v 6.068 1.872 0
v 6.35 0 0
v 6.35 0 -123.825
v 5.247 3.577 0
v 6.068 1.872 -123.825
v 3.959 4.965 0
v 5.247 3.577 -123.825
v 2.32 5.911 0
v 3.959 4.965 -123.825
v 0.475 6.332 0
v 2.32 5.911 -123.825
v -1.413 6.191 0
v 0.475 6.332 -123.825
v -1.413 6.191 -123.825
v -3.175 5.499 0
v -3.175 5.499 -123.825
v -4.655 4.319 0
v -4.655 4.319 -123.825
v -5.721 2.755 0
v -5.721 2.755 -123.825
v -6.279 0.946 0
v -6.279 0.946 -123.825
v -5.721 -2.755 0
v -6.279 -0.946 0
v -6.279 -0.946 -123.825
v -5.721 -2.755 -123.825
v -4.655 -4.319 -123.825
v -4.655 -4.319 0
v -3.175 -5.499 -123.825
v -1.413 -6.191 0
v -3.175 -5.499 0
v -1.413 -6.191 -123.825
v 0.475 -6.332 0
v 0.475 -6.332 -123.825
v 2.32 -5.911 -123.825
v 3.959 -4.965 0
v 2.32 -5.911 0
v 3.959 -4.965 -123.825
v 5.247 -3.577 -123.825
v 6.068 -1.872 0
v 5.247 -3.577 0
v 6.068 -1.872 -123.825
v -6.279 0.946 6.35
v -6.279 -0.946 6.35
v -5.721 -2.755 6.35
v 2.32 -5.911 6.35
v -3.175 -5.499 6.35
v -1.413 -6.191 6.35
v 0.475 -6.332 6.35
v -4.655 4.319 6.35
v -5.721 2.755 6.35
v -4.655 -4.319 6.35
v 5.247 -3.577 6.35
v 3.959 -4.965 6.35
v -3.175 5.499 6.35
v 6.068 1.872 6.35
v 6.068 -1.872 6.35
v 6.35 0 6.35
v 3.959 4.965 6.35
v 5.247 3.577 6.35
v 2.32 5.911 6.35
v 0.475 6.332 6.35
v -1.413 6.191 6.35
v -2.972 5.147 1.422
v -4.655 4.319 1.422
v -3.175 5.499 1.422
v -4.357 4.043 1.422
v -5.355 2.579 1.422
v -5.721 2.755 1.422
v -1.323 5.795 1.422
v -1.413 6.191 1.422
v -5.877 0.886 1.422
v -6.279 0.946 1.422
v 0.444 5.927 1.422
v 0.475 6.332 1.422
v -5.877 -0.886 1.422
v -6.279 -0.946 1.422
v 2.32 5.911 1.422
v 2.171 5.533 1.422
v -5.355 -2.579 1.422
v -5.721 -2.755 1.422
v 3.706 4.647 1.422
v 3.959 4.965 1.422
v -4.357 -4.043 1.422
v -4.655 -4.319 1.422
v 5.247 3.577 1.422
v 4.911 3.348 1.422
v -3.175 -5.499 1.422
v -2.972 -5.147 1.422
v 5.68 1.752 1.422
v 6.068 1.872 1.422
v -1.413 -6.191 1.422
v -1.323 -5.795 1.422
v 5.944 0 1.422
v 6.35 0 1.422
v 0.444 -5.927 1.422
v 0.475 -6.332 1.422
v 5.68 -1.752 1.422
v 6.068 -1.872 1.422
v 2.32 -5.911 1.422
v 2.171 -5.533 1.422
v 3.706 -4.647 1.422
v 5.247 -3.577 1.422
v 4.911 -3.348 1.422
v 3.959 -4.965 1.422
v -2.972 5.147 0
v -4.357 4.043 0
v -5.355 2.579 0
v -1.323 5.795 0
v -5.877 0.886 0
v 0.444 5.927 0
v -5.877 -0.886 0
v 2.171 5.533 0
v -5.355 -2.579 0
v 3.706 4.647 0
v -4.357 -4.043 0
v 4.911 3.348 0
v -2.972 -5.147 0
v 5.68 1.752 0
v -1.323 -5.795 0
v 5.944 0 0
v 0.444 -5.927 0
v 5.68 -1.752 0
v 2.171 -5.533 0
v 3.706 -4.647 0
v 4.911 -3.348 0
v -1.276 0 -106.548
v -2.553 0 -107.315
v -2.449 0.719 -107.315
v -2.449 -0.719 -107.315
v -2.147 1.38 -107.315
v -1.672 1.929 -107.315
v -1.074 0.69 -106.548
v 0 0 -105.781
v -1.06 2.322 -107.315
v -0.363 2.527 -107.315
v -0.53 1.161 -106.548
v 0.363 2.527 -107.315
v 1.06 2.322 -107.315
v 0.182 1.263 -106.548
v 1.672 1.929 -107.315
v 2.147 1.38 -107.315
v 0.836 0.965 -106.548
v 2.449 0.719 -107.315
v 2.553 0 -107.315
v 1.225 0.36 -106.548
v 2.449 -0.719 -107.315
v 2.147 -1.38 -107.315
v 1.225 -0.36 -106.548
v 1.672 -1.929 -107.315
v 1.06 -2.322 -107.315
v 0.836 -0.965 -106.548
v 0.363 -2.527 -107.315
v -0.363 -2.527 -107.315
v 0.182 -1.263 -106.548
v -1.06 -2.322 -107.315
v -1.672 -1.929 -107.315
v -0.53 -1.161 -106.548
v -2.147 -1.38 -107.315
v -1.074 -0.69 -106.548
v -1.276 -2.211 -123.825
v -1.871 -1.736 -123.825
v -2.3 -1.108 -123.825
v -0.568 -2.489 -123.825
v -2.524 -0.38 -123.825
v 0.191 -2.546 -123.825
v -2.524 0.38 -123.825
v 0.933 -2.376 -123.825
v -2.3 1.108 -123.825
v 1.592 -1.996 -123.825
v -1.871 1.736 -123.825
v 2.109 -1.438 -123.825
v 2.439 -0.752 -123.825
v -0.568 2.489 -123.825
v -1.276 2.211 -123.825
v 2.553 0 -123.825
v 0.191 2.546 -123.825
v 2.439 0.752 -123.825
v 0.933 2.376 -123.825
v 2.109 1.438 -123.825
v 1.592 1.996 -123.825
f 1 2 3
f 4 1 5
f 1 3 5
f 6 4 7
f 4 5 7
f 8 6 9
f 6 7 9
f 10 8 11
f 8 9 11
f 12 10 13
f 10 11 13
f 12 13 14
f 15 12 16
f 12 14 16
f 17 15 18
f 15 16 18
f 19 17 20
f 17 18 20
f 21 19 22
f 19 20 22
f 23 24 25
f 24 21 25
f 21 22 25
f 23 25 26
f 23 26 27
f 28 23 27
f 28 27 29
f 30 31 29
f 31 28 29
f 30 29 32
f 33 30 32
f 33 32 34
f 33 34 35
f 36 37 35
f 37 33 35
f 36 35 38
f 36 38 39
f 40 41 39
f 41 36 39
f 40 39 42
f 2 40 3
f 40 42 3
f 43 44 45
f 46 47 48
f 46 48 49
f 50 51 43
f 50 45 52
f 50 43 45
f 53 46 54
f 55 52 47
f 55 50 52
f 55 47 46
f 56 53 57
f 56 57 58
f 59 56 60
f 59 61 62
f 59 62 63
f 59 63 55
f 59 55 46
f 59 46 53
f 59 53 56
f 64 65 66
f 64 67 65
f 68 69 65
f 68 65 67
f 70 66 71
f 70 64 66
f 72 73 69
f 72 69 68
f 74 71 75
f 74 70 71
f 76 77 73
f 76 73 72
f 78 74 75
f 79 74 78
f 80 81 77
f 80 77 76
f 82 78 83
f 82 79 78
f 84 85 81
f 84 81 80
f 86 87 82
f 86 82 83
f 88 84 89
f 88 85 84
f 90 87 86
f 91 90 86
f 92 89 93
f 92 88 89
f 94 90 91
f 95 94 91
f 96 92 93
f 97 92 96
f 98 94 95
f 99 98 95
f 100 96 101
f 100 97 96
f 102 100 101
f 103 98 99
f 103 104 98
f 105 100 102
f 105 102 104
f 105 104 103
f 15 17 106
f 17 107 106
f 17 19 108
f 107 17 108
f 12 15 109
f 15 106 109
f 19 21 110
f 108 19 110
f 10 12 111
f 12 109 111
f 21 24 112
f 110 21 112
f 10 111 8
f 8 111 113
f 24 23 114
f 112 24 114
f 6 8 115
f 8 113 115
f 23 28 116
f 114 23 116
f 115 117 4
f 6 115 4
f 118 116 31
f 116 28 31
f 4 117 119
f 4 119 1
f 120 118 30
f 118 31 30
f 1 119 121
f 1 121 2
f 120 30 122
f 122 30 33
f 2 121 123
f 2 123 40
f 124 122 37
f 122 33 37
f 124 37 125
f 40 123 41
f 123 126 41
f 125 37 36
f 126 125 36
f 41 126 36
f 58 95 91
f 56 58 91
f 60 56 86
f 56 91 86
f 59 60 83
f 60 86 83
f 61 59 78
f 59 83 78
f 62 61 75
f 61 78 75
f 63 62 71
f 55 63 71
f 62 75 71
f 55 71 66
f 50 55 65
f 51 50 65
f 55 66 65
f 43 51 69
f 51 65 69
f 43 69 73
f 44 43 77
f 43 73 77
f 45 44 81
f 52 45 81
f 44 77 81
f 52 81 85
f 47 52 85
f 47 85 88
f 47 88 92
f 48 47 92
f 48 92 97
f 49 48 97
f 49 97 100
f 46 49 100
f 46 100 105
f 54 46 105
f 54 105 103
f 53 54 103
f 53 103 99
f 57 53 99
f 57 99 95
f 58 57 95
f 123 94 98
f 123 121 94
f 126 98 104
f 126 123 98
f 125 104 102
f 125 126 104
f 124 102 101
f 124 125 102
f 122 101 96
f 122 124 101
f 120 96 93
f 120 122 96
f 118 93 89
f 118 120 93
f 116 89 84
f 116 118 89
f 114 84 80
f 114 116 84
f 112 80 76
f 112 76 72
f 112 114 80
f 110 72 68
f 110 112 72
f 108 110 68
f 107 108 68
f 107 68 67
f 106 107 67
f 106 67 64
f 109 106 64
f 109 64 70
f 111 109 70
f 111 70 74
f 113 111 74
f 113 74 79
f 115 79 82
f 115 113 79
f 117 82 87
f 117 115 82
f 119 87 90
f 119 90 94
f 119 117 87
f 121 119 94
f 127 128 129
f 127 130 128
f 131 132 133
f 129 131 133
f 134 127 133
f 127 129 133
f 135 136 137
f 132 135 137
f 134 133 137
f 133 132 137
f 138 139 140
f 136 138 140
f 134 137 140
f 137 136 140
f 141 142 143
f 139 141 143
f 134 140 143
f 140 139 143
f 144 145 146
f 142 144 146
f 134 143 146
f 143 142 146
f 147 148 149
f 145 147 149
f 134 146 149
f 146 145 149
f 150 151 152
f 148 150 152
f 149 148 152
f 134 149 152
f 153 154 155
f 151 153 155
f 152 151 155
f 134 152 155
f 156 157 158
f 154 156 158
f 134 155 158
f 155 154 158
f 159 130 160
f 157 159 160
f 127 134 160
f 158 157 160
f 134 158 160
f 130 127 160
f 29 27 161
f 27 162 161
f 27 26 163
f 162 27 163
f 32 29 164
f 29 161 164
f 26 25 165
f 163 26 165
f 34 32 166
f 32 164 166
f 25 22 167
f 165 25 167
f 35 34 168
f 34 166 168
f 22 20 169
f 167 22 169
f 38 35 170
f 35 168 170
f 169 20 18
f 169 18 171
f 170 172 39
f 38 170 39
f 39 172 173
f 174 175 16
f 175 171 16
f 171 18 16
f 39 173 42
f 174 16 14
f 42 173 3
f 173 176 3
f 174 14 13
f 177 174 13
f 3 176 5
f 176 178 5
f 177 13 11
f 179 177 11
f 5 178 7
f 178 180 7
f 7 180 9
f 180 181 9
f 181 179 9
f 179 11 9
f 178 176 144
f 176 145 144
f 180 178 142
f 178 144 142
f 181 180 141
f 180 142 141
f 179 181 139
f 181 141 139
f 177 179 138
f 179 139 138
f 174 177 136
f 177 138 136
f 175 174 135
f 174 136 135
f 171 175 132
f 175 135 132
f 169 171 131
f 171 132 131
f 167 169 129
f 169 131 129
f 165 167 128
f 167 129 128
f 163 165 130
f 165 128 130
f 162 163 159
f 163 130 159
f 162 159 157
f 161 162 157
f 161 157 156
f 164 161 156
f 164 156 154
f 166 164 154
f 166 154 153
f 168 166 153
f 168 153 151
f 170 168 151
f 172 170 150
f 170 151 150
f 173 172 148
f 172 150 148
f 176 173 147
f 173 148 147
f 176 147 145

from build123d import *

# Parameters (mm, degrees)
BOSS_EXTRUDE1_START         = -123.825
BOSS_EXTRUDE1_OUTLINE_R     = 6.35
BOSS_EXTRUDE1_DEPTH         = 130.175
SKETCH5_W                   = 1.4224
SKETCH5_H                   = 0.4064
F_1_4_20_TAPPED_HOLE1_D     = 5.1054
F_1_4_20_TAPPED_HOLE1_DEPTH = 16.51
F_1_4_20_TAPPED_HOLE1_TIP   = 1.533816902


# Read off the part's stored shape, not the designer's step: Boss-Extrude1
with BuildPart() as part:
    # Boss-Extrude1 outline → Boss-Extrude1 (new body)
    with BuildSketch(Plane.XY.offset(BOSS_EXTRUDE1_START)):
        Circle(BOSS_EXTRUDE1_OUTLINE_R)
    extrude(amount=BOSS_EXTRUDE1_DEPTH)

    # Sketch5 → Cut-Revolve1 (revolve, cut)
    with BuildSketch(Plane(origin=(0, 0, 0), x_dir=(0, 0, -1), z_dir=(1, 0, 0)), mode=Mode.PRIVATE) as cut_revolve1_sk:
        with Locations((-0.7112, -6.1468)):
            Rectangle(SKETCH5_W, SKETCH5_H)
    revolve(cut_revolve1_sk.sketch.rotate(Axis((0, 0, 0), (0, 0, -1)), 270), axis=Axis((0, 0, 0), (0, 0, -1)), mode=Mode.SUBTRACT)

    # 1/4-20 Tapped Hole1
    with Locations(Plane(origin=(0, 0, -123.825), x_dir=(-1, 0, 0), z_dir=(0, 0, -1))):
        with Locations((0, 0)):
            Hole(F_1_4_20_TAPPED_HOLE1_D / 2, depth=F_1_4_20_TAPPED_HOLE1_DEPTH)
            with Locations((0, 0, -(F_1_4_20_TAPPED_HOLE1_DEPTH + F_1_4_20_TAPPED_HOLE1_TIP / 2))):  # 118° drill point
                Cone(0, F_1_4_20_TAPPED_HOLE1_D / 2, F_1_4_20_TAPPED_HOLE1_TIP, mode=Mode.SUBTRACT)


solid = part.part
